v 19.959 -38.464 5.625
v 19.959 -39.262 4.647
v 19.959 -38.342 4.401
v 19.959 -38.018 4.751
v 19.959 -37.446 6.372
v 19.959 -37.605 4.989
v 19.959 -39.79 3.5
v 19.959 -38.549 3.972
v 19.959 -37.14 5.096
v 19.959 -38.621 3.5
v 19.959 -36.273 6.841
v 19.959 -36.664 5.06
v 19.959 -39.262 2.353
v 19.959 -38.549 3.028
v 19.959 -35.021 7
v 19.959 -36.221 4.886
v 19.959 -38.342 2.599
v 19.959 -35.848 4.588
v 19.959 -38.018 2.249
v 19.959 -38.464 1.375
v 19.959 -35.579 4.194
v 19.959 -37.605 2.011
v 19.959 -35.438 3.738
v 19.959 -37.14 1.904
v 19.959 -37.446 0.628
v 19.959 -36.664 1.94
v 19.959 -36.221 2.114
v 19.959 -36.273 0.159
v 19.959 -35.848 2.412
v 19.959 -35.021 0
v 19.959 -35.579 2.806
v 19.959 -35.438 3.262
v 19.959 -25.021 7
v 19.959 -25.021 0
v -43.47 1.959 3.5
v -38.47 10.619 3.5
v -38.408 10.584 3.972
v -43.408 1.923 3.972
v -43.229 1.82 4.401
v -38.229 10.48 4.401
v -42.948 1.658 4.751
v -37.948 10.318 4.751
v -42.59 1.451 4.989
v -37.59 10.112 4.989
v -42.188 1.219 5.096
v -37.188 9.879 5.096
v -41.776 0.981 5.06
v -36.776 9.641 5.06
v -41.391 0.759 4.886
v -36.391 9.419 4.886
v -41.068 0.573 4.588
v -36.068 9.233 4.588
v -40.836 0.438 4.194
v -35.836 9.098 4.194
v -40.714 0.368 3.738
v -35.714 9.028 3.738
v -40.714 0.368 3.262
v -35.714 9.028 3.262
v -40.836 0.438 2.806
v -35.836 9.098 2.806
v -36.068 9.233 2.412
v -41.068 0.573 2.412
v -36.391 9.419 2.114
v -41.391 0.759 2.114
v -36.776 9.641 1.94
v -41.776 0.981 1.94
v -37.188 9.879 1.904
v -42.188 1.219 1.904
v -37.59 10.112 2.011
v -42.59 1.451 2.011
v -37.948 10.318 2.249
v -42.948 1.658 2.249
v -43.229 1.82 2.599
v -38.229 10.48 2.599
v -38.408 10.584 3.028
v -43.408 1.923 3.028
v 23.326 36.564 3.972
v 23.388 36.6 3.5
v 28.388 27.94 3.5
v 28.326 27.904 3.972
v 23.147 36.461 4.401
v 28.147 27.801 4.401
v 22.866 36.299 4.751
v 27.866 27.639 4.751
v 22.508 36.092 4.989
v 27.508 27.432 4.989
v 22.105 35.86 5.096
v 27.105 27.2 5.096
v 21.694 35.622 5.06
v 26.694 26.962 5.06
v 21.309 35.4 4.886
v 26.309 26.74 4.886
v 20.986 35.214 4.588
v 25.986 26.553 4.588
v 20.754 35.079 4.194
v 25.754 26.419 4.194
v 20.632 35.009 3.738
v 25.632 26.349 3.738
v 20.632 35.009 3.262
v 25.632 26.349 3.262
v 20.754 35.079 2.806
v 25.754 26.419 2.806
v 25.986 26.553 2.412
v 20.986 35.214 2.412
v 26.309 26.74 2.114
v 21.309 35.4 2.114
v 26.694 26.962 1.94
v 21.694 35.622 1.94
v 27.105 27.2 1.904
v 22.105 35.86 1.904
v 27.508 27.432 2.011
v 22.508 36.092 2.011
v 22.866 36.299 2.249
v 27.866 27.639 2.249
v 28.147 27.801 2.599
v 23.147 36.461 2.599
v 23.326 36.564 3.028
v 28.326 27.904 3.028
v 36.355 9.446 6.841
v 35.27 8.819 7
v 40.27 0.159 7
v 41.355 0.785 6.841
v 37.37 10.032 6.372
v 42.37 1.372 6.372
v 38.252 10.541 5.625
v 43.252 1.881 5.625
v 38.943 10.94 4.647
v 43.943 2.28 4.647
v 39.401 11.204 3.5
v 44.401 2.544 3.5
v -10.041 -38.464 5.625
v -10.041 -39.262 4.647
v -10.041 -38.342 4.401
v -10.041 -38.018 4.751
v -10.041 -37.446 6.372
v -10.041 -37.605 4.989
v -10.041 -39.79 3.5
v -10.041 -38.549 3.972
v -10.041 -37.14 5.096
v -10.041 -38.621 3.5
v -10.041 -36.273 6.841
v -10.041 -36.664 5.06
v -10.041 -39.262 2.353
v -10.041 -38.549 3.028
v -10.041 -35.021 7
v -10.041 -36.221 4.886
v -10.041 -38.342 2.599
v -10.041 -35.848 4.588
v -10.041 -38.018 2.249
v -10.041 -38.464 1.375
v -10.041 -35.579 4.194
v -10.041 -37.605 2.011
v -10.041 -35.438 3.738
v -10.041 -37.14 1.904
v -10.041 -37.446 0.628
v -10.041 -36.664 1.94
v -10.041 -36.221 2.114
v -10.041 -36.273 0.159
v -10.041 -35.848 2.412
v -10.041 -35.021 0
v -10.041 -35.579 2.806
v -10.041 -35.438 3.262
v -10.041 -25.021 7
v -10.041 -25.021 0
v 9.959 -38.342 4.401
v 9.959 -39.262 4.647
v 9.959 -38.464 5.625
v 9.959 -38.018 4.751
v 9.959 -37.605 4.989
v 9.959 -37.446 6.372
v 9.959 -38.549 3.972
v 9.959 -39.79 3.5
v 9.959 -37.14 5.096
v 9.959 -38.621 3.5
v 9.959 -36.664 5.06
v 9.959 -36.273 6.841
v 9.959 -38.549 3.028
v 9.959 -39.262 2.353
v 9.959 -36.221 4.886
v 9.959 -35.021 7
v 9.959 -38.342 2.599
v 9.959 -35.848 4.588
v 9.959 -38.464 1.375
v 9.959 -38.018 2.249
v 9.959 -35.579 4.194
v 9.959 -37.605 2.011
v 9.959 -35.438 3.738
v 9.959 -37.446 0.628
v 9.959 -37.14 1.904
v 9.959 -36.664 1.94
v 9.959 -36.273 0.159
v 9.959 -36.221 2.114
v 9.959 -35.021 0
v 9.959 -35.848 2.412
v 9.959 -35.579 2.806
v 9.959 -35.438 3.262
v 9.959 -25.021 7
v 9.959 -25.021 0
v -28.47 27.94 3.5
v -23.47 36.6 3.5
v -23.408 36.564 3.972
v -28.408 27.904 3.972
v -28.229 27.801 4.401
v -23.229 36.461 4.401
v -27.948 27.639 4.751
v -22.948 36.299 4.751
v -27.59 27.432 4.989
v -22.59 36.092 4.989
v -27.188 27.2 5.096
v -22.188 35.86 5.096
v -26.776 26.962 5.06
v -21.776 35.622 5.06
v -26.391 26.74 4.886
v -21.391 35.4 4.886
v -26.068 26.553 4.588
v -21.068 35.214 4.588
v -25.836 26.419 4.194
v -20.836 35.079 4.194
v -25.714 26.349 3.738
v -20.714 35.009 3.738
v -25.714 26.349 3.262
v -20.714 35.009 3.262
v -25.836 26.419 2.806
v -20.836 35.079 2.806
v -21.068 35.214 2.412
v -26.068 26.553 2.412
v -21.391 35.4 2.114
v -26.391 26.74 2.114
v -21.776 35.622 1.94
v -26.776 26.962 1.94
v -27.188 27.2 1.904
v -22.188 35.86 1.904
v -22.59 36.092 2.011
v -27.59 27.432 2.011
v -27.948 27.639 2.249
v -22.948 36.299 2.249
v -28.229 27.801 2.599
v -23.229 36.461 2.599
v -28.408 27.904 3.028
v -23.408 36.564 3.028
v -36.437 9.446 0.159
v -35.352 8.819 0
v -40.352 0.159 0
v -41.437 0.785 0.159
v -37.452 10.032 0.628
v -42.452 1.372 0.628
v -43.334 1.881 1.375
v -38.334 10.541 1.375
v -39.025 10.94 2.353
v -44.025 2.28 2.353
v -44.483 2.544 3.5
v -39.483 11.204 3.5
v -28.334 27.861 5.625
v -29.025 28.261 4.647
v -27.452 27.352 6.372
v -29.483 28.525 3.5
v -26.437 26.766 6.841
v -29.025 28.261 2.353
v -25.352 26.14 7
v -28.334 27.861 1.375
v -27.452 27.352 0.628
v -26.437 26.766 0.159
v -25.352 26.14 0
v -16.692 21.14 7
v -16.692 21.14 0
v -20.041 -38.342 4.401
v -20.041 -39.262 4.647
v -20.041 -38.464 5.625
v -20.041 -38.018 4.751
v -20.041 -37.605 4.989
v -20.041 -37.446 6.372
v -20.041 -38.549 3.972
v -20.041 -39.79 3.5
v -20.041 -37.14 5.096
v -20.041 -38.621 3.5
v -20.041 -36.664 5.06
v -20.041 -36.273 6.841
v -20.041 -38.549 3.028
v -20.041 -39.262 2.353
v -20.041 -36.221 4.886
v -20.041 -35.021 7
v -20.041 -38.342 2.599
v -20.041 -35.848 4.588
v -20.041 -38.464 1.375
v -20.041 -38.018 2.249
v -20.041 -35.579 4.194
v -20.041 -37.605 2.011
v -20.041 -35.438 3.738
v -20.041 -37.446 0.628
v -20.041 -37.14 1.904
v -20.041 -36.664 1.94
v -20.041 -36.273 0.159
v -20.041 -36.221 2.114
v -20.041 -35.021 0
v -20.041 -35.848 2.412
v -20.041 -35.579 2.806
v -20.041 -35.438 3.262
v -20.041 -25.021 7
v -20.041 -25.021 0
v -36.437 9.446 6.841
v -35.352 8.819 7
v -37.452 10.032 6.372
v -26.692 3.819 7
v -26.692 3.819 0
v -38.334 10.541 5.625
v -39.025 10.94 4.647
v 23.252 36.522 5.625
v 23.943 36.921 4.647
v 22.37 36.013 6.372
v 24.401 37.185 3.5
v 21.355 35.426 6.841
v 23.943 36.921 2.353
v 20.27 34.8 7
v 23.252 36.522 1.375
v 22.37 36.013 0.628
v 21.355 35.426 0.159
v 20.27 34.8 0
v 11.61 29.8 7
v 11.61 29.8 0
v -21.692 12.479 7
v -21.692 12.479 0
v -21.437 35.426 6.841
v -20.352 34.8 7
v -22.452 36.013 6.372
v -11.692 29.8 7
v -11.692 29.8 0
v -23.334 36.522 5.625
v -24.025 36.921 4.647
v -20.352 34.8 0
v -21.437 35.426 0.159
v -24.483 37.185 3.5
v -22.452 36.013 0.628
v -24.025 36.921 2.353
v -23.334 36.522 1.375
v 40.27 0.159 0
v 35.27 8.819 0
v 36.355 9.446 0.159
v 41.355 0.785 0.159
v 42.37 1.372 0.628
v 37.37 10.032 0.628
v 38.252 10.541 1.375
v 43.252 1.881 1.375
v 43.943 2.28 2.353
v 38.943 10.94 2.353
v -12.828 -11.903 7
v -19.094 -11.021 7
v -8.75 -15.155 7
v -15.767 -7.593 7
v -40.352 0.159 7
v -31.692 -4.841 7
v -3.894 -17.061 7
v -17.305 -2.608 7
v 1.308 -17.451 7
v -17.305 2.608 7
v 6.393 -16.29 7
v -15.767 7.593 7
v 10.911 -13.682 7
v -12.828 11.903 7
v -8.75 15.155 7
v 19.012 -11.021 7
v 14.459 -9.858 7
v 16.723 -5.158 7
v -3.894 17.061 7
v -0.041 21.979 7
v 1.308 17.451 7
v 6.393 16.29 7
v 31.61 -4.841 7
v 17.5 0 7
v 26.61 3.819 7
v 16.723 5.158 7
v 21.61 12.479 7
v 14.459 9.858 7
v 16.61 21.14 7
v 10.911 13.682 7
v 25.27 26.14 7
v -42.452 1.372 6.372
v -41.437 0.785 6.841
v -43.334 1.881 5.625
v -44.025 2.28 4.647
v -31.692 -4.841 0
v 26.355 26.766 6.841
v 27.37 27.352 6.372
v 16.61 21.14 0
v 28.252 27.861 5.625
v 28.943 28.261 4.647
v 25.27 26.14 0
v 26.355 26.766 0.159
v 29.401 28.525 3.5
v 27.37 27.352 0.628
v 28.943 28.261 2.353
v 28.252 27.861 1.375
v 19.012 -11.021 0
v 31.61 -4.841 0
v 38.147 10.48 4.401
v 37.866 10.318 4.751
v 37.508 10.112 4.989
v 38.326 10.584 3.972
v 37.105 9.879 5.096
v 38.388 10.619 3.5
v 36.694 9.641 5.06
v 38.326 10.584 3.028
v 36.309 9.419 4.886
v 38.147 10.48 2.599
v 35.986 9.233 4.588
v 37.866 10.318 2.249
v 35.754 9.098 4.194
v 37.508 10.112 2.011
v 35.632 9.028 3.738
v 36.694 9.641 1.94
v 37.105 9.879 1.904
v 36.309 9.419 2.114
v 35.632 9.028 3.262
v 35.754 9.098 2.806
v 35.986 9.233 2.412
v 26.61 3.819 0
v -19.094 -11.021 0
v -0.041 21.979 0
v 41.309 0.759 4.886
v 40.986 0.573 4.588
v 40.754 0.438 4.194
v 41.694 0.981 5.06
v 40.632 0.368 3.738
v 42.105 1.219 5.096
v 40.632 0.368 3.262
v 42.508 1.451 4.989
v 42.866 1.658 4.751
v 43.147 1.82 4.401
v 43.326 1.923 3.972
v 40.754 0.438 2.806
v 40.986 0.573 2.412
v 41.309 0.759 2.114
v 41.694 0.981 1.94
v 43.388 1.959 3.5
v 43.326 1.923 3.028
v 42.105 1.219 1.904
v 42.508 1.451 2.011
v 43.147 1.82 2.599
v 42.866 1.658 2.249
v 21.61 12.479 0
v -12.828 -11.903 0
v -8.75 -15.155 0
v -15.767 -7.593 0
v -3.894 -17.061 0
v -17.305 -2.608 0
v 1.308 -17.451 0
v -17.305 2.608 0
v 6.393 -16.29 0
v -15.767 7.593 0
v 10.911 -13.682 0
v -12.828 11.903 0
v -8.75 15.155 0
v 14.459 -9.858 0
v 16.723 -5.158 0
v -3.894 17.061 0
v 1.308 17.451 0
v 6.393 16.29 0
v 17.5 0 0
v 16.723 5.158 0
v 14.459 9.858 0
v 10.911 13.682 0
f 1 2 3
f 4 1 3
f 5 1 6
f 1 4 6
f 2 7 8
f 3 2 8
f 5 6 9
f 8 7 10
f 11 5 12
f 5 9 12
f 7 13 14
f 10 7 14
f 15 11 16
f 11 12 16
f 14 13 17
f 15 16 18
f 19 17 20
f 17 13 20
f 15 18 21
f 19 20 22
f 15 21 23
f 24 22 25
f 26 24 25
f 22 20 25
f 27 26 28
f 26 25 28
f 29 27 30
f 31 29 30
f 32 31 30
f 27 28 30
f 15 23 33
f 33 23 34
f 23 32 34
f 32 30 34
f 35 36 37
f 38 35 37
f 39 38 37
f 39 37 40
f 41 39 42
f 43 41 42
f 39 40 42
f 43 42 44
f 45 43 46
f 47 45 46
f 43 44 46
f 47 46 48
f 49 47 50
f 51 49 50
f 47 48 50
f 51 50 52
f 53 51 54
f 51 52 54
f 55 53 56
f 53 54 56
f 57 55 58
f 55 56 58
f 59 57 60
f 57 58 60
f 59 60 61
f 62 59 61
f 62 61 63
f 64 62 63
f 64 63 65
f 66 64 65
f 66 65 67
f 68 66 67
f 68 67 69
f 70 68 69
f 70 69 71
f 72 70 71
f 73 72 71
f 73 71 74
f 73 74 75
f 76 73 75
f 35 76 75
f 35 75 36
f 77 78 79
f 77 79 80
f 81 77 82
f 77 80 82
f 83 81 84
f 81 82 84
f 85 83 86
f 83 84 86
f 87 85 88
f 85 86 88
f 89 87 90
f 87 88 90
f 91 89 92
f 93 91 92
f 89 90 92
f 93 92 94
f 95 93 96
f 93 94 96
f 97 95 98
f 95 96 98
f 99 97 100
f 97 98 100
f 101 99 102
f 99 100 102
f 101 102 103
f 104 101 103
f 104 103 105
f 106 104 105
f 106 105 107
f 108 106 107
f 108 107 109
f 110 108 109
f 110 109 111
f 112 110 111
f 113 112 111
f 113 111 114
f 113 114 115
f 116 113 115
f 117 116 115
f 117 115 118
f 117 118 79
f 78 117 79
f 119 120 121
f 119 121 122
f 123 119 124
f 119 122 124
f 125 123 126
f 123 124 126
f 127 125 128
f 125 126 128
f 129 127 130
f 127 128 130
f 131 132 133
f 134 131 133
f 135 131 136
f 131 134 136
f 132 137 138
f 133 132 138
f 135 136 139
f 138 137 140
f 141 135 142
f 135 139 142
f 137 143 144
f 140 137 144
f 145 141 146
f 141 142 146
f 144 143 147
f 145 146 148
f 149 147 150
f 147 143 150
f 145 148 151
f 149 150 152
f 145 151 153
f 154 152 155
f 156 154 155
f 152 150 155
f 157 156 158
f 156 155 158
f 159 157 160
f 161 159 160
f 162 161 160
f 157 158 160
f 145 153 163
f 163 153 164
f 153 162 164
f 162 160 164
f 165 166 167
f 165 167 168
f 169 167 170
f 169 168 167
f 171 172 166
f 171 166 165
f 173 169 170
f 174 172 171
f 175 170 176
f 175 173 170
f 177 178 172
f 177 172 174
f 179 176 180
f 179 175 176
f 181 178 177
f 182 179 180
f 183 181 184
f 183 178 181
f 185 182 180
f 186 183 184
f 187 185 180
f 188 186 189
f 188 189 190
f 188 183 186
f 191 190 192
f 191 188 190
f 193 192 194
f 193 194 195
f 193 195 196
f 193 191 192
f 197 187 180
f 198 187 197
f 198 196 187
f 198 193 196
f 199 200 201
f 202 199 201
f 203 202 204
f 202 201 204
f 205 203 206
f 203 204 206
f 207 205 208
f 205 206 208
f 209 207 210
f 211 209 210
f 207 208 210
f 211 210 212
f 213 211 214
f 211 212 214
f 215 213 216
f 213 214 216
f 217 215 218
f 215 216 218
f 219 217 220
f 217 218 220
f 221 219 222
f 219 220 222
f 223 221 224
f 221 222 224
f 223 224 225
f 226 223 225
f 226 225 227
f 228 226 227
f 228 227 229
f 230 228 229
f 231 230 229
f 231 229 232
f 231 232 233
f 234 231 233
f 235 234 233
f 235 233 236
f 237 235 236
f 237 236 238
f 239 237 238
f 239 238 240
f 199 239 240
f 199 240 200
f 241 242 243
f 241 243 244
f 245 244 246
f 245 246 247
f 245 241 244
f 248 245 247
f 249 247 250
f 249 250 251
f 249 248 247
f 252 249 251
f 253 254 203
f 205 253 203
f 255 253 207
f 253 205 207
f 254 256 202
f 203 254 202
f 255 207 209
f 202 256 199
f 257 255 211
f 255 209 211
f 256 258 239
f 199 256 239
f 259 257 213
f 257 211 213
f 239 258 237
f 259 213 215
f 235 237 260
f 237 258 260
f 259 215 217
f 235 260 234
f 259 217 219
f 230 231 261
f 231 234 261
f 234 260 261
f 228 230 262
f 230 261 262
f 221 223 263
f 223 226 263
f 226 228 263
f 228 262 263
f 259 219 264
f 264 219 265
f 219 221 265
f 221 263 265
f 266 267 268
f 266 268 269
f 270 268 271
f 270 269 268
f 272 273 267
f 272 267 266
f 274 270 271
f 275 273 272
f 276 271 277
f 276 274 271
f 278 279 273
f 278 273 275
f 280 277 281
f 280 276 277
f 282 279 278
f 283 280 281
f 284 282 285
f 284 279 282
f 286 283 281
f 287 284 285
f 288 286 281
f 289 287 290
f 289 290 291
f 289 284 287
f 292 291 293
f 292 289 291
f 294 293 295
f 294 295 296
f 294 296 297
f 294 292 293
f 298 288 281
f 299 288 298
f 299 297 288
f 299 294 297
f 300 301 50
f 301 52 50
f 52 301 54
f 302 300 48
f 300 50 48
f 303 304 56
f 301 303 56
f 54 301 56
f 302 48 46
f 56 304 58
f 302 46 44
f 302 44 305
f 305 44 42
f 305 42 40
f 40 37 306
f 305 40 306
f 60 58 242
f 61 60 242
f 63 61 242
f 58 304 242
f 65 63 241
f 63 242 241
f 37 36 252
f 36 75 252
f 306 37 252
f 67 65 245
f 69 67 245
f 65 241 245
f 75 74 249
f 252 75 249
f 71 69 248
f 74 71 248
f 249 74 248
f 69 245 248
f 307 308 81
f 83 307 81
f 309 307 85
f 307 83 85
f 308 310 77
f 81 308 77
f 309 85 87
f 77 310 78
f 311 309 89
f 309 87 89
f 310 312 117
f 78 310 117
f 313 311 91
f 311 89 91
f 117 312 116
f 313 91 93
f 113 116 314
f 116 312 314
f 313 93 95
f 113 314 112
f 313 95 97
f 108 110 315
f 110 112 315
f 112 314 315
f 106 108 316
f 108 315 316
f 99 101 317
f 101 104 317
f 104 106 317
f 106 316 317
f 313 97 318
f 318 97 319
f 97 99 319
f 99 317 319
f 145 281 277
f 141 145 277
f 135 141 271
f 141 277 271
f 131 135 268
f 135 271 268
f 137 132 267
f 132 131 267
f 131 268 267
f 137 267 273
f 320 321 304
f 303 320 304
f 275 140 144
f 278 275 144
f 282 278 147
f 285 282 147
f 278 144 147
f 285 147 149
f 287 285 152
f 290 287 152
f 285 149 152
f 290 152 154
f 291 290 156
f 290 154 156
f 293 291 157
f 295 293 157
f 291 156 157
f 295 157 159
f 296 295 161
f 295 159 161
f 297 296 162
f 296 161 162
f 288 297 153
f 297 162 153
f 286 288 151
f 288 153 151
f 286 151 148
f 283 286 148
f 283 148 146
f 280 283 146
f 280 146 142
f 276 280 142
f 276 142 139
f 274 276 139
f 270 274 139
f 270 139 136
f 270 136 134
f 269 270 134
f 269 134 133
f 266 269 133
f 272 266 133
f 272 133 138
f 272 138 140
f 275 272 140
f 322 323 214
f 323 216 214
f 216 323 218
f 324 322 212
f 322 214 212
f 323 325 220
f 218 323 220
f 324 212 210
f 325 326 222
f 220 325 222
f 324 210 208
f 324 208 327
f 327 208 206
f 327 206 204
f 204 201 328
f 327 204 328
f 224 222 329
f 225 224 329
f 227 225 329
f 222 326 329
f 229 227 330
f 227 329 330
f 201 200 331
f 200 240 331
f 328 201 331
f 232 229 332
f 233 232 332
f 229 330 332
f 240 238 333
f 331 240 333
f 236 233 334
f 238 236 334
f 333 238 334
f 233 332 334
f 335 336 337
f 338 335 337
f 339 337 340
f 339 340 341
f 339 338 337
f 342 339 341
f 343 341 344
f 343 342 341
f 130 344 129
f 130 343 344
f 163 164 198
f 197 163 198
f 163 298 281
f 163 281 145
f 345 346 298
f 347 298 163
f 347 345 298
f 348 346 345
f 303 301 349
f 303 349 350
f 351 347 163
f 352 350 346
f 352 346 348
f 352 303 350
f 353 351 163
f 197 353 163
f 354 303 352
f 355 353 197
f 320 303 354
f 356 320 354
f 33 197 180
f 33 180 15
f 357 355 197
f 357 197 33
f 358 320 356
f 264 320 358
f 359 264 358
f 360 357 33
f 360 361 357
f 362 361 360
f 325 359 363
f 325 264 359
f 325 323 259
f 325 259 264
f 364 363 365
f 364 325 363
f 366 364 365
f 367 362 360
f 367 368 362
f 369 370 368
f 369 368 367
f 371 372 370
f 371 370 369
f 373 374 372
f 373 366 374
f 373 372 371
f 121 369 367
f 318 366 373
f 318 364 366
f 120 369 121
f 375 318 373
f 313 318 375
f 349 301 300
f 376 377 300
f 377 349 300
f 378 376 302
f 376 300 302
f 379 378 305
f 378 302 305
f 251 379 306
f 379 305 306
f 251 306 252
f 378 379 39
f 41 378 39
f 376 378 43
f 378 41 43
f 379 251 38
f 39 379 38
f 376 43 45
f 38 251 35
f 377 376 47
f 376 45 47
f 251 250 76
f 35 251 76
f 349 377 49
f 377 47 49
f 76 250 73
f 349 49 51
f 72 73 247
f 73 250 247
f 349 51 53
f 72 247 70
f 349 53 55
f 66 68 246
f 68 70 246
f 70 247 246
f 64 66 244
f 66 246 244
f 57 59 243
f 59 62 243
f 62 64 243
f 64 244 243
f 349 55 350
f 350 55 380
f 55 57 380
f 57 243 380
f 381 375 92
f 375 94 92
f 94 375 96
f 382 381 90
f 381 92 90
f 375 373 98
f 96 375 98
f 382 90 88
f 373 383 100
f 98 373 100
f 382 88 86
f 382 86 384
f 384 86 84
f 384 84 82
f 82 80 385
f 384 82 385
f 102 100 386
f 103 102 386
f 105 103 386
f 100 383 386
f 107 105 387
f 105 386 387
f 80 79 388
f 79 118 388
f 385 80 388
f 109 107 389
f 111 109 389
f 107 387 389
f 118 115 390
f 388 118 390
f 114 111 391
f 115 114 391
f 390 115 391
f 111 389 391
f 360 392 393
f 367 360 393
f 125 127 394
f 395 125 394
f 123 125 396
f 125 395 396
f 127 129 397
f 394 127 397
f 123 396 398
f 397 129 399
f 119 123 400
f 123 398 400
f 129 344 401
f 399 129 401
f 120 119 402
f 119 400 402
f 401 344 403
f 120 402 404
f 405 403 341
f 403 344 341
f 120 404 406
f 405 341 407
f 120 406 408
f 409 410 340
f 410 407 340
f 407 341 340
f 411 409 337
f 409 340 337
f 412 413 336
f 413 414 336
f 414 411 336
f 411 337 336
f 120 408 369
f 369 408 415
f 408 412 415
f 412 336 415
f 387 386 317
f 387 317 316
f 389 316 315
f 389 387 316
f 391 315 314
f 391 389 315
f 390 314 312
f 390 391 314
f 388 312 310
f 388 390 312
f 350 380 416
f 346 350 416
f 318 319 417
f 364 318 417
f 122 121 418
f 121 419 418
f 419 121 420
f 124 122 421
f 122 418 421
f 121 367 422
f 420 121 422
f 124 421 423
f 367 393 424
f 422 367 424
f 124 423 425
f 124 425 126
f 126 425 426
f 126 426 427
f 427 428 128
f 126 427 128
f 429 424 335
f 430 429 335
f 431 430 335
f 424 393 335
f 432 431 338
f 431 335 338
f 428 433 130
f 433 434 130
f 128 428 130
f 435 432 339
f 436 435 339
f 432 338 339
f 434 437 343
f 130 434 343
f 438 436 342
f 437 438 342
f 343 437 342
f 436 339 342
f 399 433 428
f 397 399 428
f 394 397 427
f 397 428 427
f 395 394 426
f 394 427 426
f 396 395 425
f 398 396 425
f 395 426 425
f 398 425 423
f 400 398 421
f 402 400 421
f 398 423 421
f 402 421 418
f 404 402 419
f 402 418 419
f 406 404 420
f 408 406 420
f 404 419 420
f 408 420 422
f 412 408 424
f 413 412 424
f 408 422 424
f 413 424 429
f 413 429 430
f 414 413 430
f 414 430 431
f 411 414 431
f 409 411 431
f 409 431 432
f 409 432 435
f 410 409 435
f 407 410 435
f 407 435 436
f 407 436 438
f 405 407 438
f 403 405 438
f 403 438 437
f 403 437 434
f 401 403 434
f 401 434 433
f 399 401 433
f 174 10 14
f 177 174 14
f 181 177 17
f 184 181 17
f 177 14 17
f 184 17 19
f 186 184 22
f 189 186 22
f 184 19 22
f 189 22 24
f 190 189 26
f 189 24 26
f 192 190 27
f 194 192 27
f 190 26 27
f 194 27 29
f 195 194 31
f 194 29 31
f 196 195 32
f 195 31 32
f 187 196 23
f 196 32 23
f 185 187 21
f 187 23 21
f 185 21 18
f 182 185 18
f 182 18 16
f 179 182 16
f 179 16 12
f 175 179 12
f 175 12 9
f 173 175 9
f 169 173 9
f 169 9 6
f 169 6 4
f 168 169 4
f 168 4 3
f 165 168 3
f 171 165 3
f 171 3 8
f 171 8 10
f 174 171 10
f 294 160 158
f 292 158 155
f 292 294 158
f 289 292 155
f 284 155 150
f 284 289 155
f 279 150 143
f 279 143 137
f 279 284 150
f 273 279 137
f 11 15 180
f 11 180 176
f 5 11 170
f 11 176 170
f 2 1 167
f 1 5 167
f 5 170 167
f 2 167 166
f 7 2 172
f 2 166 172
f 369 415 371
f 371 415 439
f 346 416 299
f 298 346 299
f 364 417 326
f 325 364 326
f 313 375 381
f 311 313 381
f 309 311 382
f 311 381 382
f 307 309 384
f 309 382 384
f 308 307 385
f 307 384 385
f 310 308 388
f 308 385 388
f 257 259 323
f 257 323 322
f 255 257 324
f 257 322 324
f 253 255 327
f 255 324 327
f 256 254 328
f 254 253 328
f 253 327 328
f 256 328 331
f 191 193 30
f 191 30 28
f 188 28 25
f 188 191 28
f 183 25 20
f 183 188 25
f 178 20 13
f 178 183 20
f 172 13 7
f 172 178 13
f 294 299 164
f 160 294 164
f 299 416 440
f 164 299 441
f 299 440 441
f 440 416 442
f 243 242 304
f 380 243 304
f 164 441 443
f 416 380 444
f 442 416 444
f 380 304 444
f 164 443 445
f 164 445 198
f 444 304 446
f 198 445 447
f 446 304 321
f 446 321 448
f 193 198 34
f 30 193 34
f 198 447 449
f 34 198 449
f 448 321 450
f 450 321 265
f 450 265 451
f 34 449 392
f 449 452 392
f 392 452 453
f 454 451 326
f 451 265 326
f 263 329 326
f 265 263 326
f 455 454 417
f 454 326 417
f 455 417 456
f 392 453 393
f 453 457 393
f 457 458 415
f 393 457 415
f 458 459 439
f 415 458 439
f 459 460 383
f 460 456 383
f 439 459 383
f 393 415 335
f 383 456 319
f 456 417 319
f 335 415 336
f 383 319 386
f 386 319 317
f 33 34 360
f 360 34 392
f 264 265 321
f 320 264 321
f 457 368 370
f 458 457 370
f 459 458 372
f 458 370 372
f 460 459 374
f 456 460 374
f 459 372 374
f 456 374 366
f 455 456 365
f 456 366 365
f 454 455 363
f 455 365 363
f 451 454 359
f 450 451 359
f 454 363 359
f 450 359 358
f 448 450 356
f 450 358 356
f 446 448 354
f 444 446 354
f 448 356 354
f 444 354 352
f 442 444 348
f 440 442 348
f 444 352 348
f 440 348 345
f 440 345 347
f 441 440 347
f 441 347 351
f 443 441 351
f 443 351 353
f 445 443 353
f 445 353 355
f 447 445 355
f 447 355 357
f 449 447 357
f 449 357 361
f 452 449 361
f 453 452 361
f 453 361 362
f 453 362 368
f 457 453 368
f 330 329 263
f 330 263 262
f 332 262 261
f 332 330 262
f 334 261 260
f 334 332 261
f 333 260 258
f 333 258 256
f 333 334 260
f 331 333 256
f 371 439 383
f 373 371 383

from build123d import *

# Parameters (mm, degrees)
F0_W          = 10
F0_H          = 15
F1_DEPTH      = 7
F3_DEPTH      = 60
F4_R          = 1.6
F5_DEPTH      = 60
F6_R          = 1.6
F7_DEPTH      = 60
F8_R          = 17.5
F9_DEPTH      = 25
F10_T1_DEPTH  = 35
F10_T3_DEPTH  = 35
F10_T5_DEPTH  = 35
F10_T7_DEPTH  = 35
F10_T9_DEPTH  = 35
F10_T11_DEPTH = 35


# Not quite as in the source:
# - a fillet or chamfer that OpenCascade refuses, or shapes differently, is made with other operations: its cross-section is extruded or revolved along the edge and cut away or added
# - a feature names something its author has since deleted; it is built from what else it names


with BuildPart() as f1:
    # F0 (on Top) → F1 (new body)
    with BuildSketch(Plane.XY):
        Polygon((-19.0935776077, -11.020506829), (-0.0410187244, -0.020506829), (-21.6916538191, 12.479493171), (-26.6916538191, 3.8192391331), (-31.6916538191, -4.8410149047), align=None)
        Polygon((-0.0410187244, 21.979493171), (-0.0410187244, -0.020506829), (21.6096163702, 12.479493171), (16.6096163702, 21.1397472088), (11.6096163702, 29.8000012467), align=None)
        Polygon((19.0115401588, -11.020506829), (-0.0410187244, -0.020506829), (-0.0410187244, -25.020506829), (9.9589812756, -25.020506829), (19.9589812756, -25.020506829), align=None)
        Polygon((-0.0410187244, -25.020506829), (-0.0410187244, -0.020506829), (-19.0935776077, -11.020506829), (-20.0410187244, -25.020506829), (-10.0410187244, -25.020506829), align=None)
        Polygon((-21.6916538191, 12.479493171), (-0.0410187244, -0.020506829), (-0.0410187244, 21.979493171), (-11.6916538191, 29.8000012467), (-16.6916538191, 21.1397472088), align=None)
        Polygon((21.6096163702, 12.479493171), (-0.0410187244, -0.020506829), (19.0115401588, -11.020506829), (31.6096163702, -4.8410149047), (26.6096163702, 3.8192391331), align=None)
        Polygon((-29.6820348758, 28.6397472088), (-16.6916538191, 21.1397472088), (-11.6916538191, 29.8000012467), (-24.6820348758, 37.3000012467), align=None)
        Polygon((-31.6916538191, -4.8410149047), (-26.6916538191, 3.8192391331), (-39.6820348758, 11.3192391331), (-44.6820348758, 2.6589850953), align=None)
        Polygon((39.5999974269, 11.3192391331), (26.6096163702, 3.8192391331), (31.6096163702, -4.8410149047), (44.5999974269, 2.6589850953), align=None)
        Polygon((11.6096163702, 29.8000012467), (16.6096163702, 21.1397472088), (29.5999974269, 28.6397472088), (24.5999974269, 37.3000012467), align=None)
        with Locations((-15.0410187244, -32.520506829)):
            Rectangle(F0_W, F0_H)
        with Locations((14.9589812756, -32.520506829)):
            Rectangle(F0_W, F0_H)
    extrude(amount=F1_DEPTH)

    # F2 (on face) → F3 (cut)
    with BuildSketch(Plane.YZ.offset(19.9589812756)):
        with BuildLine():
            ThreePointArc((-35.420506829, 3.5), (-37.020506829, 5.1), (-38.620506829, 3.5))
            ThreePointArc((-38.620506829, 3.5), (-37.020506829, 1.9), (-35.420506829, 3.5))
        make_face()
    extrude(amount=-F3_DEPTH, mode=Mode.SUBTRACT)

    # F4 (on face) → F5 (cut)
    with BuildSketch(Plane(origin=(9.9986250363, -17.3181265688, 0), x_dir=(0.8660254038, 0.5, 0), z_dir=(0.5, -0.8660254038, 0))):
        with Locations((36.9542233281, 3.5)):
            Circle(F4_R)
    extrude(amount=-F5_DEPTH, mode=Mode.SUBTRACT)

    # F6 (on face) → F7 (cut)
    with BuildSketch(Plane(origin=(9.9808656014, 17.2873663252, 0), x_dir=(-0.8660254038, 0.5, 0), z_dir=(0.5, 0.8660254038, 0))):
        with Locations((37.0252698429, 3.5)):
            Circle(F6_R)
    extrude(amount=-F7_DEPTH, mode=Mode.SUBTRACT)

    # F8 (on face) → F9 (cut)
    with BuildSketch(Plane.XY.offset(7)):
        Circle(F8_R)
    extrude(amount=-F9_DEPTH, mode=Mode.SUBTRACT)

    # F10: fillet of radius 5 on 12 edges, made by hand

    # F10_s2 → F10_t1 (cut)
    with BuildSketch(Plane.YZ.offset(-32.5410187244)):
        with BuildLine():
            ThreePointArc((-35.020506829, 7), (-38.556040735, 5.5355339059), (-40.020506829, 2))
            Line((-40.020506829, 2), (-40.020506829, 7))
            Line((-40.020506829, 7), (-35.020506829, 7))
        make_face()
        with BuildLine():
            ThreePointArc((-35.020506829, 0), (-38.556040735, 1.4644660941), (-40.020506829, 5))
            Line((-40.020506829, 5), (-40.020506829, 0))
            Line((-40.020506829, 0), (-35.020506829, 0))
        make_face()
    extrude(amount=F10_T1_DEPTH, mode=Mode.SUBTRACT)

    # F10_s4 → F10_t3 (cut)
    with BuildSketch(Plane.YZ.offset(-2.5410187244)):
        with BuildLine():
            ThreePointArc((-35.020506829, 0), (-38.556040735, 1.4644660941), (-40.020506829, 5))
            Line((-40.020506829, 5), (-40.020506829, 0))
            Line((-40.020506829, 0), (-35.020506829, 0))
        make_face()
        with BuildLine():
            ThreePointArc((-35.020506829, 7), (-38.556040735, 5.5355339059), (-40.020506829, 2))
            Line((-40.020506829, 2), (-40.020506829, 7))
            Line((-40.020506829, 7), (-35.020506829, 7))
        make_face()
    extrude(amount=F10_T3_DEPTH, mode=Mode.SUBTRACT)

    # F10_s6 → F10_t5 (cut)
    with BuildSketch(Plane(origin=(16.2486250363, -28.1434441161, 0), x_dir=(0, 0, 1), z_dir=(-0.5, 0.8660254038, 0))):
        with BuildLine():
            ThreePointArc((7, 34.9542233281), (5.5355339059, 38.489757234), (2, 39.9542233281))
            Line((2, 39.9542233281), (7, 39.9542233281))
            Line((7, 39.9542233281), (7, 34.9542233281))
        make_face()
        with BuildLine():
            ThreePointArc((0, 34.9542233281), (1.4644660941, 38.489757234), (5, 39.9542233281))
            Line((5, 39.9542233281), (0, 39.9542233281))
            Line((0, 39.9542233281), (0, 34.9542233281))
        make_face()
    extrude(amount=F10_T5_DEPTH, mode=Mode.SUBTRACT)

    # F10_s8 → F10_t7 (cut)
    with BuildSketch(Plane(origin=(1.2486250363, -2.1626820025, 0), x_dir=(0, 0, 1), z_dir=(-0.5, 0.8660254038, 0))):
        with BuildLine():
            ThreePointArc((7, 34.9542233281), (5.5355339059, 38.489757234), (2, 39.9542233281))
            Line((2, 39.9542233281), (7, 39.9542233281))
            Line((7, 39.9542233281), (7, 34.9542233281))
        make_face()
        with BuildLine():
            ThreePointArc((0, 34.9542233281), (1.4644660941, 38.489757234), (5, 39.9542233281))
            Line((5, 39.9542233281), (0, 39.9542233281))
            Line((0, 39.9542233281), (0, 34.9542233281))
        make_face()
    extrude(amount=F10_T7_DEPTH, mode=Mode.SUBTRACT)

    # F10_s10 → F10_t9 (cut)
    with BuildSketch(Plane(origin=(16.2308656014, 28.1126838725, 0), x_dir=(0, 0, 1), z_dir=(-0.5, -0.8660254038, 0))):
        with BuildLine():
            ThreePointArc((7, 35.0252698429), (5.5355339059, 38.5608037488), (2, 40.0252698429))
            Line((2, 40.0252698429), (7, 40.0252698429))
            Line((7, 40.0252698429), (7, 35.0252698429))
        make_face()
        with BuildLine():
            ThreePointArc((0, 35.0252698429), (1.4644660941, 38.5608037488), (5, 40.0252698429))
            Line((5, 40.0252698429), (0, 40.0252698429))
            Line((0, 40.0252698429), (0, 35.0252698429))
        make_face()
    extrude(amount=F10_T9_DEPTH, mode=Mode.SUBTRACT)

    # F10_s12 → F10_t11 (cut)
    with BuildSketch(Plane(origin=(1.2308656014, 2.131921759, 0), x_dir=(0, 0, 1), z_dir=(-0.5, -0.8660254038, 0))):
        with BuildLine():
            ThreePointArc((7, 35.0252698429), (5.5355339059, 38.5608037488), (2, 40.0252698429))
            Line((2, 40.0252698429), (7, 40.0252698429))
            Line((7, 40.0252698429), (7, 35.0252698429))
        make_face()
        with BuildLine():
            ThreePointArc((0, 35.0252698429), (1.4644660941, 38.5608037488), (5, 40.0252698429))
            Line((5, 40.0252698429), (0, 40.0252698429))
            Line((0, 40.0252698429), (0, 35.0252698429))
        make_face()
    extrude(amount=F10_T11_DEPTH, mode=Mode.SUBTRACT)


solid = f1.part
